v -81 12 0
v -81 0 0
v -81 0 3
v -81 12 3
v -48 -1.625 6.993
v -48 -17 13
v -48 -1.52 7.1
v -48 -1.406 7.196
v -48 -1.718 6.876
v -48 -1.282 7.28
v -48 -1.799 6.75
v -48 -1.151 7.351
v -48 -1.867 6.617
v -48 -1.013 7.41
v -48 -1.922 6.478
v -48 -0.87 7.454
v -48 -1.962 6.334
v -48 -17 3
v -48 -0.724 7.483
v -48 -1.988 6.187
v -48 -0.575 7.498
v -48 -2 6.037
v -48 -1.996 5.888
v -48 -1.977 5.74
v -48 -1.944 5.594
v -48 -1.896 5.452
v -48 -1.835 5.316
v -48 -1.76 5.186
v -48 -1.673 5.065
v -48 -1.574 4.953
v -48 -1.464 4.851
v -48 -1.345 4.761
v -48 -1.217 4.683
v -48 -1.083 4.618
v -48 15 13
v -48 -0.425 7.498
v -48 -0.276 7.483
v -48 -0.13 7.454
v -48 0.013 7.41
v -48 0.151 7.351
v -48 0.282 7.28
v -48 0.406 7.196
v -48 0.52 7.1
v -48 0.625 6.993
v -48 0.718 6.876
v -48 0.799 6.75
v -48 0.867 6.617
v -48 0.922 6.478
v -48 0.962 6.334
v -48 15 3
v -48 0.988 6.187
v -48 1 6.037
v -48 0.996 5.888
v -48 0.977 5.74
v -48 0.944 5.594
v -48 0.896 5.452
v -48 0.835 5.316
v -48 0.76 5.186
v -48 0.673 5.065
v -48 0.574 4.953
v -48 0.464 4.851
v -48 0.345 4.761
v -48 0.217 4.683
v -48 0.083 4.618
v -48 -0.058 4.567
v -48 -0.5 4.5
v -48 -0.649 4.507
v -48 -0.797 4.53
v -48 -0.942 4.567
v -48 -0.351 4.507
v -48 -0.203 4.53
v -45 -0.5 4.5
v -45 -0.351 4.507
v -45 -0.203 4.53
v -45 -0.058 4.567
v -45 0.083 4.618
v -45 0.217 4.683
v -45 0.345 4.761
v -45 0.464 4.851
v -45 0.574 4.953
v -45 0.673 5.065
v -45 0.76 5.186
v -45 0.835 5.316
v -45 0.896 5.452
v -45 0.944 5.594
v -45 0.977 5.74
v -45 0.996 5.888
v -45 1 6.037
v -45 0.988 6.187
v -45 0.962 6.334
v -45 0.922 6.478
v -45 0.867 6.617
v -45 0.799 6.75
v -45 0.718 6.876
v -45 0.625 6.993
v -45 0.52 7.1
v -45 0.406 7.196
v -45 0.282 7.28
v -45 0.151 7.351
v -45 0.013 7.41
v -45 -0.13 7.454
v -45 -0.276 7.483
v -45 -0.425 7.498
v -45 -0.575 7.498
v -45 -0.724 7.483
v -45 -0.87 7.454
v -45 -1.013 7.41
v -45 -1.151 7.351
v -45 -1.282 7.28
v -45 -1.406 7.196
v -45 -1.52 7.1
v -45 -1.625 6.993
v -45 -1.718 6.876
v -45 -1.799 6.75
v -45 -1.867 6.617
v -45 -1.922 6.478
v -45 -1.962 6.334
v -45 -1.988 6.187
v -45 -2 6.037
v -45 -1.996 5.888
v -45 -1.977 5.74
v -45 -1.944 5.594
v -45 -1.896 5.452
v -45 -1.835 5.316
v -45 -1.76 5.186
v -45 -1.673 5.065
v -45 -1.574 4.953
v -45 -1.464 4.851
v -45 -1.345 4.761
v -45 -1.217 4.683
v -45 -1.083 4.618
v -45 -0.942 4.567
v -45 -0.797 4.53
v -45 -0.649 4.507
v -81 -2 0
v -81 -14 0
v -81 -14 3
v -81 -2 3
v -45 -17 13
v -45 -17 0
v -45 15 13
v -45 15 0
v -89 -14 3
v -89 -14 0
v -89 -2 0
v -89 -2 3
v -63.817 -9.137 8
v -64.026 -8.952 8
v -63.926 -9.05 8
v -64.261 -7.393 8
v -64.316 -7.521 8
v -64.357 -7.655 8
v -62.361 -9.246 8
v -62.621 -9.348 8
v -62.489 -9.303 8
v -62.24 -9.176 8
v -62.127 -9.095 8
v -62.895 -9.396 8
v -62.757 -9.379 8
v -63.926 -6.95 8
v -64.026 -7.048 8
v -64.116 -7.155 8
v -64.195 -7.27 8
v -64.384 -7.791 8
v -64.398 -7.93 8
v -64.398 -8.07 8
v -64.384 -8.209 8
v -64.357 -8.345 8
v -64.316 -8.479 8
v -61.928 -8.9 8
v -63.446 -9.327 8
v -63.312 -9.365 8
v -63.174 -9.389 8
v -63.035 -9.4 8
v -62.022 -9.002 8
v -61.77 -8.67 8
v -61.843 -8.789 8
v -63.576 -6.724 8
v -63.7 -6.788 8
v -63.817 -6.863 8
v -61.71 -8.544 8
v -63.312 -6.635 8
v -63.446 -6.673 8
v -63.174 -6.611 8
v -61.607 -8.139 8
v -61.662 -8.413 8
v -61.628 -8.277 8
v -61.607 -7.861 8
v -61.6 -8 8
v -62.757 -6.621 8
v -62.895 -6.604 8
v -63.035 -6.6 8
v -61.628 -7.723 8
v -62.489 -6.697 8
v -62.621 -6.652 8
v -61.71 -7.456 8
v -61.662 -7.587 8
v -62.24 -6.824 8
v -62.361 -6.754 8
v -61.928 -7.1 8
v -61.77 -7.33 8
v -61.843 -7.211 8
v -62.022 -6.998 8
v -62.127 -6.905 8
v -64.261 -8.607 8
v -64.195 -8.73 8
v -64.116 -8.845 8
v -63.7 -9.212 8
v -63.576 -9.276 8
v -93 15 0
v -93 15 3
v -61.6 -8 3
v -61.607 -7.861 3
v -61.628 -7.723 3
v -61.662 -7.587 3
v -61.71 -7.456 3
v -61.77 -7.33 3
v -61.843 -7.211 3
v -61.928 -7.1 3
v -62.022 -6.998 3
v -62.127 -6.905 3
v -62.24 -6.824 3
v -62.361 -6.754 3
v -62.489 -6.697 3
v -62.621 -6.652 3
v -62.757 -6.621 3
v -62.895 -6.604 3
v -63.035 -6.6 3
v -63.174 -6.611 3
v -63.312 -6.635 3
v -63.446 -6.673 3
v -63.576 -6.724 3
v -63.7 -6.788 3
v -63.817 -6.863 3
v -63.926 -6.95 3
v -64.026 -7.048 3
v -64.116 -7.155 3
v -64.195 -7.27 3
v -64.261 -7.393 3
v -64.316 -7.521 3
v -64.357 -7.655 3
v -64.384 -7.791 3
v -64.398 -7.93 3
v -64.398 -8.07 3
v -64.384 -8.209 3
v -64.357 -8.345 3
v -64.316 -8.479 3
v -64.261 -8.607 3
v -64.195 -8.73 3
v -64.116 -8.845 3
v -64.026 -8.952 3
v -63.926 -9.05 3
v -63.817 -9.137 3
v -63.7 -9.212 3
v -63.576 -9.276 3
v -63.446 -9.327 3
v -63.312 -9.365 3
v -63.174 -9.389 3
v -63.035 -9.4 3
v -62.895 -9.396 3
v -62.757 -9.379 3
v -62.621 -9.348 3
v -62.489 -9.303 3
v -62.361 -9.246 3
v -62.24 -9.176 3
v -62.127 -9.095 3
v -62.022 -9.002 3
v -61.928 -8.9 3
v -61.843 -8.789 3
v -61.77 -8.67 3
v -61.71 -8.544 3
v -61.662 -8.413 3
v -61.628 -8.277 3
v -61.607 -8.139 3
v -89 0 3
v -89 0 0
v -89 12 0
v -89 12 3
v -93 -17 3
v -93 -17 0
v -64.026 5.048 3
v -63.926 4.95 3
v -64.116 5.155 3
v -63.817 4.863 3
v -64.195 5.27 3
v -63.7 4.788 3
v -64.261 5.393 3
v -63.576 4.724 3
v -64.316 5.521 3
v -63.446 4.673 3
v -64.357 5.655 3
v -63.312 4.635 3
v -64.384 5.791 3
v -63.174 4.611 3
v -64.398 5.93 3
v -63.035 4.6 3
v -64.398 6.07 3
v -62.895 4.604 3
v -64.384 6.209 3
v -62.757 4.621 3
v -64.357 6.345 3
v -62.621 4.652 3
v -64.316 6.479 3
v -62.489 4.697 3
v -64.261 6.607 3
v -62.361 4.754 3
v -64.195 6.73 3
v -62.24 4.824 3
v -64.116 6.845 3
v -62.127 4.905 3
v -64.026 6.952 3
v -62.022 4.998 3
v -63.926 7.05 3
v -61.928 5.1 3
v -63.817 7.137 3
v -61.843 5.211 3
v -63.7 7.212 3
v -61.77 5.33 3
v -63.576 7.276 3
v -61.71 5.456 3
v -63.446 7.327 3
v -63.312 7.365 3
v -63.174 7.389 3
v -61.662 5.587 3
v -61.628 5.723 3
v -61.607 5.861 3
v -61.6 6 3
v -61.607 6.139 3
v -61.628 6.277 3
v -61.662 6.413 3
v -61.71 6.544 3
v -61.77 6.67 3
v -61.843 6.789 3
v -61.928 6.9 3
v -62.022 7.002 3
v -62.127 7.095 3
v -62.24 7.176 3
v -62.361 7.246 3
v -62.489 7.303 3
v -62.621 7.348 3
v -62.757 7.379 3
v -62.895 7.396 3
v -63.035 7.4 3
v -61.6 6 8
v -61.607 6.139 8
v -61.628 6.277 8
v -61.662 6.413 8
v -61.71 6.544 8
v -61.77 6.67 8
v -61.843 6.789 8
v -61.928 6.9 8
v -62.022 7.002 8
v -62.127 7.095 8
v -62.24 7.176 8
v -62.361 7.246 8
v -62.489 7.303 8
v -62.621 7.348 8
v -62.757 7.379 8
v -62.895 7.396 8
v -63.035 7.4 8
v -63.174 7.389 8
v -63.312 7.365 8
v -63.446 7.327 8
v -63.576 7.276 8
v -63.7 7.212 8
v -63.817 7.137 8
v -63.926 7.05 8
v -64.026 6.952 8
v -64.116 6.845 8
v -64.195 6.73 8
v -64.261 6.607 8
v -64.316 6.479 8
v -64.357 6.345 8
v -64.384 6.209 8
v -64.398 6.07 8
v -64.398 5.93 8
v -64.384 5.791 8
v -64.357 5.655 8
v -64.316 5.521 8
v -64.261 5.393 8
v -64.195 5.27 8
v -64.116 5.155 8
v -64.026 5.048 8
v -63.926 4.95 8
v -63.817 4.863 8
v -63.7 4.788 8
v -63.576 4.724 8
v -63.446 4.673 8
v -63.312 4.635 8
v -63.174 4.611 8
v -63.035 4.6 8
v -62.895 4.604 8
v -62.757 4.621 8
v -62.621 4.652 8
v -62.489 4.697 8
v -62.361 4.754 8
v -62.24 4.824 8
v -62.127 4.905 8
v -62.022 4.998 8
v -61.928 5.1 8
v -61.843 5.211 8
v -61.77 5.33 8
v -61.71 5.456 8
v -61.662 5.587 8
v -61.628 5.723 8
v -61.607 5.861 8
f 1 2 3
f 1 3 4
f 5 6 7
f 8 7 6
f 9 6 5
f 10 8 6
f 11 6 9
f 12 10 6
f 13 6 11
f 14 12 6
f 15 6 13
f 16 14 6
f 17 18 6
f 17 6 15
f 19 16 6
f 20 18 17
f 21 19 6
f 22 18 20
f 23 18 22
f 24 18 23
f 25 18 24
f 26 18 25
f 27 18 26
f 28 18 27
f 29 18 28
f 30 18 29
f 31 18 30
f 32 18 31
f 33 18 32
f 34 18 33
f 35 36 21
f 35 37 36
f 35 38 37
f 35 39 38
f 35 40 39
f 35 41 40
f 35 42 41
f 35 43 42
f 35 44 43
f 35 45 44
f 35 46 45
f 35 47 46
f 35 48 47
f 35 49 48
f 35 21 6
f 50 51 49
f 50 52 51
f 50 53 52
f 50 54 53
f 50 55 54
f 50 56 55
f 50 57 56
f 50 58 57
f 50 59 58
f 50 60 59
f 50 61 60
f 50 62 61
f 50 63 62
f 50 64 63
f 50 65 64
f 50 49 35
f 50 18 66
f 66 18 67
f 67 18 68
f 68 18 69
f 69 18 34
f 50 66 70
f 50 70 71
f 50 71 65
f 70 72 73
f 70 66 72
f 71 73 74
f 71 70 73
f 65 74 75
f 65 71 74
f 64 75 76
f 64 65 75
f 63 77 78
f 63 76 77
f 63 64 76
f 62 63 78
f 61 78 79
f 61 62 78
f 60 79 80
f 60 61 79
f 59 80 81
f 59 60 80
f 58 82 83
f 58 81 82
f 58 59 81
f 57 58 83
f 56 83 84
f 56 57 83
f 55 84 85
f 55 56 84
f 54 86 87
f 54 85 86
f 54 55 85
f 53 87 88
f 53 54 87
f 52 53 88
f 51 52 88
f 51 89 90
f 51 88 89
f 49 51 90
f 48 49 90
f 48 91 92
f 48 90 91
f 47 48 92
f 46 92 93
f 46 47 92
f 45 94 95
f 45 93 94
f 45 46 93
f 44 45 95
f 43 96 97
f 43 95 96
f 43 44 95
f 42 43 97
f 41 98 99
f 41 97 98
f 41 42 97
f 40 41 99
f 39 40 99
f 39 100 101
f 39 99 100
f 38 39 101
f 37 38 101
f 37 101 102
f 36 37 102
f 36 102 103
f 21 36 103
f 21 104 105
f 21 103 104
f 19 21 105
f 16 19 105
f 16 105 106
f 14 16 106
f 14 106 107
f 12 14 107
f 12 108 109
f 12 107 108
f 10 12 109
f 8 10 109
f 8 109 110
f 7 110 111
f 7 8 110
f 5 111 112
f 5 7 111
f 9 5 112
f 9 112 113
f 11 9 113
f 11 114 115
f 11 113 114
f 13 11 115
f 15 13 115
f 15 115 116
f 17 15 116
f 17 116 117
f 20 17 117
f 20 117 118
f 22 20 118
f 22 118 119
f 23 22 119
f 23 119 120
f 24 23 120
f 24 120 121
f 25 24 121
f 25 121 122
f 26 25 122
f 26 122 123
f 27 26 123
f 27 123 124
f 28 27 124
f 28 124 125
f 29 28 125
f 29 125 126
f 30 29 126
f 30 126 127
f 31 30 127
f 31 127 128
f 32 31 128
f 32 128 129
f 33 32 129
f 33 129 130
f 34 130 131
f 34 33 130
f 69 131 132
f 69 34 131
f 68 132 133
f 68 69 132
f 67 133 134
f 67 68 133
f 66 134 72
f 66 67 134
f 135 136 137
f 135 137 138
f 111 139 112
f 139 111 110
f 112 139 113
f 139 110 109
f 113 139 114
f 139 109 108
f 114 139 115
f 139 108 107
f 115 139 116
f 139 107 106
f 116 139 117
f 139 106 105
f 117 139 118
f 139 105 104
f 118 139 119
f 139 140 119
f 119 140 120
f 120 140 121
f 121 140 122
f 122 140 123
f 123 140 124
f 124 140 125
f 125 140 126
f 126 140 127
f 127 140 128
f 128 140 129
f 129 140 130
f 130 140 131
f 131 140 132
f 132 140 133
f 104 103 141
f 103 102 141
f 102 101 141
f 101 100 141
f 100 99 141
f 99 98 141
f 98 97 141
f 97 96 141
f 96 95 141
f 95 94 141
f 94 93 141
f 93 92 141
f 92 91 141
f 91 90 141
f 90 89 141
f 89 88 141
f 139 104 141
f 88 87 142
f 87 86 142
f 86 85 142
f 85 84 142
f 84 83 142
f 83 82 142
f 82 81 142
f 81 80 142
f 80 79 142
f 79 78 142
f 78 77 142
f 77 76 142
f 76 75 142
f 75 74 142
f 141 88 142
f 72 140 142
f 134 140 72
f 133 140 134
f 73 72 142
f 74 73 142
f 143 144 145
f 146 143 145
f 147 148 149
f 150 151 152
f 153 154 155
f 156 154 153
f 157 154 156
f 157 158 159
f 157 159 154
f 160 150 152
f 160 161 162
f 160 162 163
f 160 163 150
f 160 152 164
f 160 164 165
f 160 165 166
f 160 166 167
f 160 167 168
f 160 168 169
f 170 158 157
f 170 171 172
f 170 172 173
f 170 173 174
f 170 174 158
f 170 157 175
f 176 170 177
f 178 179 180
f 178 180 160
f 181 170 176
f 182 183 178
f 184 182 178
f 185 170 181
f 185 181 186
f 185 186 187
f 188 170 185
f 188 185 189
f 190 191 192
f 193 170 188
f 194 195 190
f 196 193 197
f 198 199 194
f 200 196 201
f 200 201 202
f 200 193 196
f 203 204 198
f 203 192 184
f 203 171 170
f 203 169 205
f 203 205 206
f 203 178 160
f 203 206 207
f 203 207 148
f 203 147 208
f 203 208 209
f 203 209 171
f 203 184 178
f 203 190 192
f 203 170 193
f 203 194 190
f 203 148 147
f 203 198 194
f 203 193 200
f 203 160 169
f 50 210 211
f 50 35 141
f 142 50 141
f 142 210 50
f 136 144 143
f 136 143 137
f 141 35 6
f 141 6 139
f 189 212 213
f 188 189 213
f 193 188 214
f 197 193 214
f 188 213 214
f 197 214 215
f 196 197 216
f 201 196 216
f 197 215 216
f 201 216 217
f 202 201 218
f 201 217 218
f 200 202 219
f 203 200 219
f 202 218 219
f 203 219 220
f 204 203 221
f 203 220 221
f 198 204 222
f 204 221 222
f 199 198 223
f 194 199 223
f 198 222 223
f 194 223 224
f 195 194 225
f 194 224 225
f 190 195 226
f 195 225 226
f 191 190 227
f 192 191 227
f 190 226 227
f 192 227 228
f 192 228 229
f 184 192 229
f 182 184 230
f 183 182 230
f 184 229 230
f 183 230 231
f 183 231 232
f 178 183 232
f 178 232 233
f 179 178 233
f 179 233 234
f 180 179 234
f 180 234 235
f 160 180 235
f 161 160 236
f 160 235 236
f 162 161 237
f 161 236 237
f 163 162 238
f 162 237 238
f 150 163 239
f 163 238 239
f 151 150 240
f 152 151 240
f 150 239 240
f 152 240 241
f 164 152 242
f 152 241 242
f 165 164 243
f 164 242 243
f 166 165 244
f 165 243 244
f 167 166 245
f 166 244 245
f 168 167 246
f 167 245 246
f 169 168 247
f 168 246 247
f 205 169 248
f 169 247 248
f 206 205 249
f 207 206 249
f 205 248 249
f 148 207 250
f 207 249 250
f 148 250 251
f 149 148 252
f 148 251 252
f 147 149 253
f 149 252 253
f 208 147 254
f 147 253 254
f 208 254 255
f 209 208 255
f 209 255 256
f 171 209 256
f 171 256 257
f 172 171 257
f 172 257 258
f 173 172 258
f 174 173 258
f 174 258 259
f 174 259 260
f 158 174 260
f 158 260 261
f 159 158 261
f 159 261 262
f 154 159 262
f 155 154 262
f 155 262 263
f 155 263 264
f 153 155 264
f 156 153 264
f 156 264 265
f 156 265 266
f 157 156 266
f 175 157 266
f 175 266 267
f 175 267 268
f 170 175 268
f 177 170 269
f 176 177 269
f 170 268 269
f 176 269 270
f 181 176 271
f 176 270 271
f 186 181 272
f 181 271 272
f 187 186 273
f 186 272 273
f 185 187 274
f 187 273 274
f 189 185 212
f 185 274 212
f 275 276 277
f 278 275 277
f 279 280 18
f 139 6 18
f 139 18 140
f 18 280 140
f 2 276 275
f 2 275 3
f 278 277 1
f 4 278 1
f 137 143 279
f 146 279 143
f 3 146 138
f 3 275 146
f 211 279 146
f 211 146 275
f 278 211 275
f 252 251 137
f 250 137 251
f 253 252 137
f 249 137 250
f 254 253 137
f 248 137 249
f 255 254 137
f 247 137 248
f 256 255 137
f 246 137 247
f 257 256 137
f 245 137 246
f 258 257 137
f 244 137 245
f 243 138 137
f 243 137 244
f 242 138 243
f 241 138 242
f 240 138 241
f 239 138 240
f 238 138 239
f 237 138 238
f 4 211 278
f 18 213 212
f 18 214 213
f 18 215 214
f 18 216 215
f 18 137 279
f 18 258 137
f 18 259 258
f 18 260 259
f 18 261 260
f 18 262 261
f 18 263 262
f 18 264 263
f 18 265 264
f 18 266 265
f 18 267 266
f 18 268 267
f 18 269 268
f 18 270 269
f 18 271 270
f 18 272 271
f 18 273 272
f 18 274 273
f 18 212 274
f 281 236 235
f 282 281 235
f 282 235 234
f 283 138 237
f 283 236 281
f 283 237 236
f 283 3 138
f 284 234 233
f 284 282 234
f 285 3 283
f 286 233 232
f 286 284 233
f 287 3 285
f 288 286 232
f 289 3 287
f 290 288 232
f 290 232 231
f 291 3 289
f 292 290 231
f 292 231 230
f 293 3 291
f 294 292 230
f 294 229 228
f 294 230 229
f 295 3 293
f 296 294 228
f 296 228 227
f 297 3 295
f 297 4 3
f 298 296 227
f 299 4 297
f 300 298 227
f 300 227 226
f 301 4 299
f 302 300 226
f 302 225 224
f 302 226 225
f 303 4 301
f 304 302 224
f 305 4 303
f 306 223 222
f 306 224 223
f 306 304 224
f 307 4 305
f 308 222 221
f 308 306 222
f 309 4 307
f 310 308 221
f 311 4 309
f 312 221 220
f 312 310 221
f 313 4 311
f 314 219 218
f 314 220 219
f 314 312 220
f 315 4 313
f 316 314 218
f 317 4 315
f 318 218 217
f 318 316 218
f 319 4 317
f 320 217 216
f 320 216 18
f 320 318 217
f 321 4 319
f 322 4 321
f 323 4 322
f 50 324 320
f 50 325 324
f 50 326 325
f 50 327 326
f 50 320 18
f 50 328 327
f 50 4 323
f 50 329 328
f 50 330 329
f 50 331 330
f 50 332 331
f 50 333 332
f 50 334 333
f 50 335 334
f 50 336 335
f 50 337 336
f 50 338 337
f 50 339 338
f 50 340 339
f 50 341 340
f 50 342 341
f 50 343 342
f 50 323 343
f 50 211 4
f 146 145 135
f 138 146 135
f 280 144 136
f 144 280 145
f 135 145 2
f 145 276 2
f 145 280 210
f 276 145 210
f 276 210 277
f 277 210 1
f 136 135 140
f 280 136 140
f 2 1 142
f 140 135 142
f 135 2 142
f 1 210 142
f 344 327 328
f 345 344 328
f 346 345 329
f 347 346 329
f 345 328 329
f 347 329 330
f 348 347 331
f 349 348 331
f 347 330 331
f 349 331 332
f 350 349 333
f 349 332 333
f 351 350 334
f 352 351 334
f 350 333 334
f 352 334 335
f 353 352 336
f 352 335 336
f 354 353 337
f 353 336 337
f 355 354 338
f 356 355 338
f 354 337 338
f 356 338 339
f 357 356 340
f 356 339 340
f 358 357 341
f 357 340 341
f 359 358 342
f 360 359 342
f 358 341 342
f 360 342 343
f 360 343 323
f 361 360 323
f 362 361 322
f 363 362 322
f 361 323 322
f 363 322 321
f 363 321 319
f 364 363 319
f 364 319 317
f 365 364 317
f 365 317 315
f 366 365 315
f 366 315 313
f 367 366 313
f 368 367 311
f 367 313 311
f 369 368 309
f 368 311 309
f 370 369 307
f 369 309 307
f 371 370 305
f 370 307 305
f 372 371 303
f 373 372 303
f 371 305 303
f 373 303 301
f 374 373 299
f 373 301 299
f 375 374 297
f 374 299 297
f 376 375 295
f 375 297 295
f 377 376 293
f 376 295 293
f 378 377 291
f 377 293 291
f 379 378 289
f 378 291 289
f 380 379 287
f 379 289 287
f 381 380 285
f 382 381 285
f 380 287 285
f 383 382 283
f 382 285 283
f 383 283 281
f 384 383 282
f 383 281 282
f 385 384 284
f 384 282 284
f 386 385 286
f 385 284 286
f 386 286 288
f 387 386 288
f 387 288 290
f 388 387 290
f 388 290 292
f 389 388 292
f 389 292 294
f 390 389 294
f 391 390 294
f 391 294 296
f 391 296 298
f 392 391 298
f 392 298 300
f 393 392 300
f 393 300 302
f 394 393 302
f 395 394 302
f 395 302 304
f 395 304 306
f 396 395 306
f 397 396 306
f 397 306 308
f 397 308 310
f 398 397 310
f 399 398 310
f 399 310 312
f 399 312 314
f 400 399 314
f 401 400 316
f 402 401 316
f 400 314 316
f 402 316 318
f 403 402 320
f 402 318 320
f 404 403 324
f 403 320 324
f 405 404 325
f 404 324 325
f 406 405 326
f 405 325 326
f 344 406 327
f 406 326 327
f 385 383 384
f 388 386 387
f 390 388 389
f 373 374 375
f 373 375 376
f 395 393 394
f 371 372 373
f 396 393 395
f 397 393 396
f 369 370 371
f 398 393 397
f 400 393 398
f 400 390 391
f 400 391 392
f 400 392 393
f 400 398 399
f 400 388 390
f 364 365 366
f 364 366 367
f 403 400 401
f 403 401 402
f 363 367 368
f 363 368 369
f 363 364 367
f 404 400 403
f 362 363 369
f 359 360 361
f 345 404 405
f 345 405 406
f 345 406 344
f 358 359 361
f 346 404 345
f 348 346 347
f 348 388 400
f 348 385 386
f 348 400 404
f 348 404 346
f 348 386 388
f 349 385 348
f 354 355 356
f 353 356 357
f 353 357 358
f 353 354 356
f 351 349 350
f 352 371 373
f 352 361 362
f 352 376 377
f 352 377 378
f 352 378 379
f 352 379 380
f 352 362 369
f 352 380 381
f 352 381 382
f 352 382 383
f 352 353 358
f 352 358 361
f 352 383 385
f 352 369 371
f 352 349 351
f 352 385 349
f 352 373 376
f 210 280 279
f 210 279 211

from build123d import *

# Parameters (mm, degrees)
CYLINDER032_R           = 1.4
CYLINDER032_DEPTH       = 5
CYLINDER033_R           = 1.4
CYLINDER033_DEPTH       = 5
BOX046_W                = 8
BOX046_H                = 12
BOX046_DEPTH            = 10
BOX045_W                = 8
BOX045_H                = 12
BOX045_DEPTH            = 10
CYLINDER031_R           = 1.5
CYLINDER031_DEPTH       = 10
CYLINDER031_PITCH_ANGLE = 90
BOX044_W                = 3
BOX044_H                = 32
BOX044_DEPTH            = 13
BOX043_W                = 48
BOX043_H                = 32
BOX043_DEPTH            = 3


with BuildPart() as cilindro032:
    # Cylinder032 → Cylinder032 (new body)
    with BuildSketch(Plane(origin=(-63, 6, 3), x_dir=(1, 0, 0), z_dir=(0, 0, 1))):
        Circle(CYLINDER032_R)
    extrude(amount=CYLINDER032_DEPTH)


with BuildPart() as cilindro033:
    # Cylinder033 → Cylinder033 (new body)
    with BuildSketch(Plane(origin=(-63, -8, 3), x_dir=(1, 0, 0), z_dir=(0, 0, 1))):
        Circle(CYLINDER033_R)
    extrude(amount=CYLINDER033_DEPTH)


with BuildPart() as cubo040:
    # Box046 → Box046 (new body)
    with BuildSketch(Plane(origin=(-89, 0, -2), x_dir=(1, 0, 0), z_dir=(0, 0, 1))):
        with Locations((4, 6)):
            Rectangle(BOX046_W, BOX046_H)
    extrude(amount=BOX046_DEPTH)


with BuildPart() as cubo039:
    # Box045 → Box045 (new body)
    with BuildSketch(Plane(origin=(-89, -14, -2), x_dir=(1, 0, 0), z_dir=(0, 0, 1))):
        with Locations((4, 6)):
            Rectangle(BOX045_W, BOX045_H)
    extrude(amount=BOX045_DEPTH)


with BuildPart() as cilindro031:
    # Cylinder031 → Cylinder031 (new body)
    with BuildSketch(Plane.XY):
        Circle(CYLINDER031_R)
    extrude(amount=CYLINDER031_DEPTH)


with BuildPart() as cilindro031_1:
    # Cylinder031 pitch: moved
    add(cilindro031.part.rotate(Axis((0, 0, 0), (0, 1, 0)), CYLINDER031_PITCH_ANGLE))


with BuildPart() as cilindro031_2:
    # Cylinder031 placement: moved
    add(cilindro031_1.part.moved(Location((-51, -0.5, 6))))


with BuildPart() as cubo038:
    # Box044 → Box044 (new body)
    with BuildSketch(Plane(origin=(-48, -17, 0), x_dir=(1, 0, 0), z_dir=(0, 0, 1))):
        with Locations((1.5, 16)):
            Rectangle(BOX044_W, BOX044_H)
    extrude(amount=BOX044_DEPTH)


with BuildPart() as soportesensorestcrt5000:
    # Box043 → Box043 (new body)
    with BuildSketch(Plane(origin=(-93, -17, 0), x_dir=(1, 0, 0), z_dir=(0, 0, 1))):
        with Locations((24, 16)):
            Rectangle(BOX043_W, BOX043_H)
    extrude(amount=BOX043_DEPTH)

    # Fusion013: union Cubo038
    add(cubo038.part)

    # Cut056: cut Cilindro031
    add(cilindro031_2.part, mode=Mode.SUBTRACT)

    # Cut057: cut Cubo039
    add(cubo039.part, mode=Mode.SUBTRACT)

    # Cut058: cut Cubo040
    add(cubo040.part, mode=Mode.SUBTRACT)

    # Fusion014: union Cilindro032, Cilindro033
    add(cilindro032.part)
    add(cilindro033.part)


solid = soportesensorestcrt5000.part
